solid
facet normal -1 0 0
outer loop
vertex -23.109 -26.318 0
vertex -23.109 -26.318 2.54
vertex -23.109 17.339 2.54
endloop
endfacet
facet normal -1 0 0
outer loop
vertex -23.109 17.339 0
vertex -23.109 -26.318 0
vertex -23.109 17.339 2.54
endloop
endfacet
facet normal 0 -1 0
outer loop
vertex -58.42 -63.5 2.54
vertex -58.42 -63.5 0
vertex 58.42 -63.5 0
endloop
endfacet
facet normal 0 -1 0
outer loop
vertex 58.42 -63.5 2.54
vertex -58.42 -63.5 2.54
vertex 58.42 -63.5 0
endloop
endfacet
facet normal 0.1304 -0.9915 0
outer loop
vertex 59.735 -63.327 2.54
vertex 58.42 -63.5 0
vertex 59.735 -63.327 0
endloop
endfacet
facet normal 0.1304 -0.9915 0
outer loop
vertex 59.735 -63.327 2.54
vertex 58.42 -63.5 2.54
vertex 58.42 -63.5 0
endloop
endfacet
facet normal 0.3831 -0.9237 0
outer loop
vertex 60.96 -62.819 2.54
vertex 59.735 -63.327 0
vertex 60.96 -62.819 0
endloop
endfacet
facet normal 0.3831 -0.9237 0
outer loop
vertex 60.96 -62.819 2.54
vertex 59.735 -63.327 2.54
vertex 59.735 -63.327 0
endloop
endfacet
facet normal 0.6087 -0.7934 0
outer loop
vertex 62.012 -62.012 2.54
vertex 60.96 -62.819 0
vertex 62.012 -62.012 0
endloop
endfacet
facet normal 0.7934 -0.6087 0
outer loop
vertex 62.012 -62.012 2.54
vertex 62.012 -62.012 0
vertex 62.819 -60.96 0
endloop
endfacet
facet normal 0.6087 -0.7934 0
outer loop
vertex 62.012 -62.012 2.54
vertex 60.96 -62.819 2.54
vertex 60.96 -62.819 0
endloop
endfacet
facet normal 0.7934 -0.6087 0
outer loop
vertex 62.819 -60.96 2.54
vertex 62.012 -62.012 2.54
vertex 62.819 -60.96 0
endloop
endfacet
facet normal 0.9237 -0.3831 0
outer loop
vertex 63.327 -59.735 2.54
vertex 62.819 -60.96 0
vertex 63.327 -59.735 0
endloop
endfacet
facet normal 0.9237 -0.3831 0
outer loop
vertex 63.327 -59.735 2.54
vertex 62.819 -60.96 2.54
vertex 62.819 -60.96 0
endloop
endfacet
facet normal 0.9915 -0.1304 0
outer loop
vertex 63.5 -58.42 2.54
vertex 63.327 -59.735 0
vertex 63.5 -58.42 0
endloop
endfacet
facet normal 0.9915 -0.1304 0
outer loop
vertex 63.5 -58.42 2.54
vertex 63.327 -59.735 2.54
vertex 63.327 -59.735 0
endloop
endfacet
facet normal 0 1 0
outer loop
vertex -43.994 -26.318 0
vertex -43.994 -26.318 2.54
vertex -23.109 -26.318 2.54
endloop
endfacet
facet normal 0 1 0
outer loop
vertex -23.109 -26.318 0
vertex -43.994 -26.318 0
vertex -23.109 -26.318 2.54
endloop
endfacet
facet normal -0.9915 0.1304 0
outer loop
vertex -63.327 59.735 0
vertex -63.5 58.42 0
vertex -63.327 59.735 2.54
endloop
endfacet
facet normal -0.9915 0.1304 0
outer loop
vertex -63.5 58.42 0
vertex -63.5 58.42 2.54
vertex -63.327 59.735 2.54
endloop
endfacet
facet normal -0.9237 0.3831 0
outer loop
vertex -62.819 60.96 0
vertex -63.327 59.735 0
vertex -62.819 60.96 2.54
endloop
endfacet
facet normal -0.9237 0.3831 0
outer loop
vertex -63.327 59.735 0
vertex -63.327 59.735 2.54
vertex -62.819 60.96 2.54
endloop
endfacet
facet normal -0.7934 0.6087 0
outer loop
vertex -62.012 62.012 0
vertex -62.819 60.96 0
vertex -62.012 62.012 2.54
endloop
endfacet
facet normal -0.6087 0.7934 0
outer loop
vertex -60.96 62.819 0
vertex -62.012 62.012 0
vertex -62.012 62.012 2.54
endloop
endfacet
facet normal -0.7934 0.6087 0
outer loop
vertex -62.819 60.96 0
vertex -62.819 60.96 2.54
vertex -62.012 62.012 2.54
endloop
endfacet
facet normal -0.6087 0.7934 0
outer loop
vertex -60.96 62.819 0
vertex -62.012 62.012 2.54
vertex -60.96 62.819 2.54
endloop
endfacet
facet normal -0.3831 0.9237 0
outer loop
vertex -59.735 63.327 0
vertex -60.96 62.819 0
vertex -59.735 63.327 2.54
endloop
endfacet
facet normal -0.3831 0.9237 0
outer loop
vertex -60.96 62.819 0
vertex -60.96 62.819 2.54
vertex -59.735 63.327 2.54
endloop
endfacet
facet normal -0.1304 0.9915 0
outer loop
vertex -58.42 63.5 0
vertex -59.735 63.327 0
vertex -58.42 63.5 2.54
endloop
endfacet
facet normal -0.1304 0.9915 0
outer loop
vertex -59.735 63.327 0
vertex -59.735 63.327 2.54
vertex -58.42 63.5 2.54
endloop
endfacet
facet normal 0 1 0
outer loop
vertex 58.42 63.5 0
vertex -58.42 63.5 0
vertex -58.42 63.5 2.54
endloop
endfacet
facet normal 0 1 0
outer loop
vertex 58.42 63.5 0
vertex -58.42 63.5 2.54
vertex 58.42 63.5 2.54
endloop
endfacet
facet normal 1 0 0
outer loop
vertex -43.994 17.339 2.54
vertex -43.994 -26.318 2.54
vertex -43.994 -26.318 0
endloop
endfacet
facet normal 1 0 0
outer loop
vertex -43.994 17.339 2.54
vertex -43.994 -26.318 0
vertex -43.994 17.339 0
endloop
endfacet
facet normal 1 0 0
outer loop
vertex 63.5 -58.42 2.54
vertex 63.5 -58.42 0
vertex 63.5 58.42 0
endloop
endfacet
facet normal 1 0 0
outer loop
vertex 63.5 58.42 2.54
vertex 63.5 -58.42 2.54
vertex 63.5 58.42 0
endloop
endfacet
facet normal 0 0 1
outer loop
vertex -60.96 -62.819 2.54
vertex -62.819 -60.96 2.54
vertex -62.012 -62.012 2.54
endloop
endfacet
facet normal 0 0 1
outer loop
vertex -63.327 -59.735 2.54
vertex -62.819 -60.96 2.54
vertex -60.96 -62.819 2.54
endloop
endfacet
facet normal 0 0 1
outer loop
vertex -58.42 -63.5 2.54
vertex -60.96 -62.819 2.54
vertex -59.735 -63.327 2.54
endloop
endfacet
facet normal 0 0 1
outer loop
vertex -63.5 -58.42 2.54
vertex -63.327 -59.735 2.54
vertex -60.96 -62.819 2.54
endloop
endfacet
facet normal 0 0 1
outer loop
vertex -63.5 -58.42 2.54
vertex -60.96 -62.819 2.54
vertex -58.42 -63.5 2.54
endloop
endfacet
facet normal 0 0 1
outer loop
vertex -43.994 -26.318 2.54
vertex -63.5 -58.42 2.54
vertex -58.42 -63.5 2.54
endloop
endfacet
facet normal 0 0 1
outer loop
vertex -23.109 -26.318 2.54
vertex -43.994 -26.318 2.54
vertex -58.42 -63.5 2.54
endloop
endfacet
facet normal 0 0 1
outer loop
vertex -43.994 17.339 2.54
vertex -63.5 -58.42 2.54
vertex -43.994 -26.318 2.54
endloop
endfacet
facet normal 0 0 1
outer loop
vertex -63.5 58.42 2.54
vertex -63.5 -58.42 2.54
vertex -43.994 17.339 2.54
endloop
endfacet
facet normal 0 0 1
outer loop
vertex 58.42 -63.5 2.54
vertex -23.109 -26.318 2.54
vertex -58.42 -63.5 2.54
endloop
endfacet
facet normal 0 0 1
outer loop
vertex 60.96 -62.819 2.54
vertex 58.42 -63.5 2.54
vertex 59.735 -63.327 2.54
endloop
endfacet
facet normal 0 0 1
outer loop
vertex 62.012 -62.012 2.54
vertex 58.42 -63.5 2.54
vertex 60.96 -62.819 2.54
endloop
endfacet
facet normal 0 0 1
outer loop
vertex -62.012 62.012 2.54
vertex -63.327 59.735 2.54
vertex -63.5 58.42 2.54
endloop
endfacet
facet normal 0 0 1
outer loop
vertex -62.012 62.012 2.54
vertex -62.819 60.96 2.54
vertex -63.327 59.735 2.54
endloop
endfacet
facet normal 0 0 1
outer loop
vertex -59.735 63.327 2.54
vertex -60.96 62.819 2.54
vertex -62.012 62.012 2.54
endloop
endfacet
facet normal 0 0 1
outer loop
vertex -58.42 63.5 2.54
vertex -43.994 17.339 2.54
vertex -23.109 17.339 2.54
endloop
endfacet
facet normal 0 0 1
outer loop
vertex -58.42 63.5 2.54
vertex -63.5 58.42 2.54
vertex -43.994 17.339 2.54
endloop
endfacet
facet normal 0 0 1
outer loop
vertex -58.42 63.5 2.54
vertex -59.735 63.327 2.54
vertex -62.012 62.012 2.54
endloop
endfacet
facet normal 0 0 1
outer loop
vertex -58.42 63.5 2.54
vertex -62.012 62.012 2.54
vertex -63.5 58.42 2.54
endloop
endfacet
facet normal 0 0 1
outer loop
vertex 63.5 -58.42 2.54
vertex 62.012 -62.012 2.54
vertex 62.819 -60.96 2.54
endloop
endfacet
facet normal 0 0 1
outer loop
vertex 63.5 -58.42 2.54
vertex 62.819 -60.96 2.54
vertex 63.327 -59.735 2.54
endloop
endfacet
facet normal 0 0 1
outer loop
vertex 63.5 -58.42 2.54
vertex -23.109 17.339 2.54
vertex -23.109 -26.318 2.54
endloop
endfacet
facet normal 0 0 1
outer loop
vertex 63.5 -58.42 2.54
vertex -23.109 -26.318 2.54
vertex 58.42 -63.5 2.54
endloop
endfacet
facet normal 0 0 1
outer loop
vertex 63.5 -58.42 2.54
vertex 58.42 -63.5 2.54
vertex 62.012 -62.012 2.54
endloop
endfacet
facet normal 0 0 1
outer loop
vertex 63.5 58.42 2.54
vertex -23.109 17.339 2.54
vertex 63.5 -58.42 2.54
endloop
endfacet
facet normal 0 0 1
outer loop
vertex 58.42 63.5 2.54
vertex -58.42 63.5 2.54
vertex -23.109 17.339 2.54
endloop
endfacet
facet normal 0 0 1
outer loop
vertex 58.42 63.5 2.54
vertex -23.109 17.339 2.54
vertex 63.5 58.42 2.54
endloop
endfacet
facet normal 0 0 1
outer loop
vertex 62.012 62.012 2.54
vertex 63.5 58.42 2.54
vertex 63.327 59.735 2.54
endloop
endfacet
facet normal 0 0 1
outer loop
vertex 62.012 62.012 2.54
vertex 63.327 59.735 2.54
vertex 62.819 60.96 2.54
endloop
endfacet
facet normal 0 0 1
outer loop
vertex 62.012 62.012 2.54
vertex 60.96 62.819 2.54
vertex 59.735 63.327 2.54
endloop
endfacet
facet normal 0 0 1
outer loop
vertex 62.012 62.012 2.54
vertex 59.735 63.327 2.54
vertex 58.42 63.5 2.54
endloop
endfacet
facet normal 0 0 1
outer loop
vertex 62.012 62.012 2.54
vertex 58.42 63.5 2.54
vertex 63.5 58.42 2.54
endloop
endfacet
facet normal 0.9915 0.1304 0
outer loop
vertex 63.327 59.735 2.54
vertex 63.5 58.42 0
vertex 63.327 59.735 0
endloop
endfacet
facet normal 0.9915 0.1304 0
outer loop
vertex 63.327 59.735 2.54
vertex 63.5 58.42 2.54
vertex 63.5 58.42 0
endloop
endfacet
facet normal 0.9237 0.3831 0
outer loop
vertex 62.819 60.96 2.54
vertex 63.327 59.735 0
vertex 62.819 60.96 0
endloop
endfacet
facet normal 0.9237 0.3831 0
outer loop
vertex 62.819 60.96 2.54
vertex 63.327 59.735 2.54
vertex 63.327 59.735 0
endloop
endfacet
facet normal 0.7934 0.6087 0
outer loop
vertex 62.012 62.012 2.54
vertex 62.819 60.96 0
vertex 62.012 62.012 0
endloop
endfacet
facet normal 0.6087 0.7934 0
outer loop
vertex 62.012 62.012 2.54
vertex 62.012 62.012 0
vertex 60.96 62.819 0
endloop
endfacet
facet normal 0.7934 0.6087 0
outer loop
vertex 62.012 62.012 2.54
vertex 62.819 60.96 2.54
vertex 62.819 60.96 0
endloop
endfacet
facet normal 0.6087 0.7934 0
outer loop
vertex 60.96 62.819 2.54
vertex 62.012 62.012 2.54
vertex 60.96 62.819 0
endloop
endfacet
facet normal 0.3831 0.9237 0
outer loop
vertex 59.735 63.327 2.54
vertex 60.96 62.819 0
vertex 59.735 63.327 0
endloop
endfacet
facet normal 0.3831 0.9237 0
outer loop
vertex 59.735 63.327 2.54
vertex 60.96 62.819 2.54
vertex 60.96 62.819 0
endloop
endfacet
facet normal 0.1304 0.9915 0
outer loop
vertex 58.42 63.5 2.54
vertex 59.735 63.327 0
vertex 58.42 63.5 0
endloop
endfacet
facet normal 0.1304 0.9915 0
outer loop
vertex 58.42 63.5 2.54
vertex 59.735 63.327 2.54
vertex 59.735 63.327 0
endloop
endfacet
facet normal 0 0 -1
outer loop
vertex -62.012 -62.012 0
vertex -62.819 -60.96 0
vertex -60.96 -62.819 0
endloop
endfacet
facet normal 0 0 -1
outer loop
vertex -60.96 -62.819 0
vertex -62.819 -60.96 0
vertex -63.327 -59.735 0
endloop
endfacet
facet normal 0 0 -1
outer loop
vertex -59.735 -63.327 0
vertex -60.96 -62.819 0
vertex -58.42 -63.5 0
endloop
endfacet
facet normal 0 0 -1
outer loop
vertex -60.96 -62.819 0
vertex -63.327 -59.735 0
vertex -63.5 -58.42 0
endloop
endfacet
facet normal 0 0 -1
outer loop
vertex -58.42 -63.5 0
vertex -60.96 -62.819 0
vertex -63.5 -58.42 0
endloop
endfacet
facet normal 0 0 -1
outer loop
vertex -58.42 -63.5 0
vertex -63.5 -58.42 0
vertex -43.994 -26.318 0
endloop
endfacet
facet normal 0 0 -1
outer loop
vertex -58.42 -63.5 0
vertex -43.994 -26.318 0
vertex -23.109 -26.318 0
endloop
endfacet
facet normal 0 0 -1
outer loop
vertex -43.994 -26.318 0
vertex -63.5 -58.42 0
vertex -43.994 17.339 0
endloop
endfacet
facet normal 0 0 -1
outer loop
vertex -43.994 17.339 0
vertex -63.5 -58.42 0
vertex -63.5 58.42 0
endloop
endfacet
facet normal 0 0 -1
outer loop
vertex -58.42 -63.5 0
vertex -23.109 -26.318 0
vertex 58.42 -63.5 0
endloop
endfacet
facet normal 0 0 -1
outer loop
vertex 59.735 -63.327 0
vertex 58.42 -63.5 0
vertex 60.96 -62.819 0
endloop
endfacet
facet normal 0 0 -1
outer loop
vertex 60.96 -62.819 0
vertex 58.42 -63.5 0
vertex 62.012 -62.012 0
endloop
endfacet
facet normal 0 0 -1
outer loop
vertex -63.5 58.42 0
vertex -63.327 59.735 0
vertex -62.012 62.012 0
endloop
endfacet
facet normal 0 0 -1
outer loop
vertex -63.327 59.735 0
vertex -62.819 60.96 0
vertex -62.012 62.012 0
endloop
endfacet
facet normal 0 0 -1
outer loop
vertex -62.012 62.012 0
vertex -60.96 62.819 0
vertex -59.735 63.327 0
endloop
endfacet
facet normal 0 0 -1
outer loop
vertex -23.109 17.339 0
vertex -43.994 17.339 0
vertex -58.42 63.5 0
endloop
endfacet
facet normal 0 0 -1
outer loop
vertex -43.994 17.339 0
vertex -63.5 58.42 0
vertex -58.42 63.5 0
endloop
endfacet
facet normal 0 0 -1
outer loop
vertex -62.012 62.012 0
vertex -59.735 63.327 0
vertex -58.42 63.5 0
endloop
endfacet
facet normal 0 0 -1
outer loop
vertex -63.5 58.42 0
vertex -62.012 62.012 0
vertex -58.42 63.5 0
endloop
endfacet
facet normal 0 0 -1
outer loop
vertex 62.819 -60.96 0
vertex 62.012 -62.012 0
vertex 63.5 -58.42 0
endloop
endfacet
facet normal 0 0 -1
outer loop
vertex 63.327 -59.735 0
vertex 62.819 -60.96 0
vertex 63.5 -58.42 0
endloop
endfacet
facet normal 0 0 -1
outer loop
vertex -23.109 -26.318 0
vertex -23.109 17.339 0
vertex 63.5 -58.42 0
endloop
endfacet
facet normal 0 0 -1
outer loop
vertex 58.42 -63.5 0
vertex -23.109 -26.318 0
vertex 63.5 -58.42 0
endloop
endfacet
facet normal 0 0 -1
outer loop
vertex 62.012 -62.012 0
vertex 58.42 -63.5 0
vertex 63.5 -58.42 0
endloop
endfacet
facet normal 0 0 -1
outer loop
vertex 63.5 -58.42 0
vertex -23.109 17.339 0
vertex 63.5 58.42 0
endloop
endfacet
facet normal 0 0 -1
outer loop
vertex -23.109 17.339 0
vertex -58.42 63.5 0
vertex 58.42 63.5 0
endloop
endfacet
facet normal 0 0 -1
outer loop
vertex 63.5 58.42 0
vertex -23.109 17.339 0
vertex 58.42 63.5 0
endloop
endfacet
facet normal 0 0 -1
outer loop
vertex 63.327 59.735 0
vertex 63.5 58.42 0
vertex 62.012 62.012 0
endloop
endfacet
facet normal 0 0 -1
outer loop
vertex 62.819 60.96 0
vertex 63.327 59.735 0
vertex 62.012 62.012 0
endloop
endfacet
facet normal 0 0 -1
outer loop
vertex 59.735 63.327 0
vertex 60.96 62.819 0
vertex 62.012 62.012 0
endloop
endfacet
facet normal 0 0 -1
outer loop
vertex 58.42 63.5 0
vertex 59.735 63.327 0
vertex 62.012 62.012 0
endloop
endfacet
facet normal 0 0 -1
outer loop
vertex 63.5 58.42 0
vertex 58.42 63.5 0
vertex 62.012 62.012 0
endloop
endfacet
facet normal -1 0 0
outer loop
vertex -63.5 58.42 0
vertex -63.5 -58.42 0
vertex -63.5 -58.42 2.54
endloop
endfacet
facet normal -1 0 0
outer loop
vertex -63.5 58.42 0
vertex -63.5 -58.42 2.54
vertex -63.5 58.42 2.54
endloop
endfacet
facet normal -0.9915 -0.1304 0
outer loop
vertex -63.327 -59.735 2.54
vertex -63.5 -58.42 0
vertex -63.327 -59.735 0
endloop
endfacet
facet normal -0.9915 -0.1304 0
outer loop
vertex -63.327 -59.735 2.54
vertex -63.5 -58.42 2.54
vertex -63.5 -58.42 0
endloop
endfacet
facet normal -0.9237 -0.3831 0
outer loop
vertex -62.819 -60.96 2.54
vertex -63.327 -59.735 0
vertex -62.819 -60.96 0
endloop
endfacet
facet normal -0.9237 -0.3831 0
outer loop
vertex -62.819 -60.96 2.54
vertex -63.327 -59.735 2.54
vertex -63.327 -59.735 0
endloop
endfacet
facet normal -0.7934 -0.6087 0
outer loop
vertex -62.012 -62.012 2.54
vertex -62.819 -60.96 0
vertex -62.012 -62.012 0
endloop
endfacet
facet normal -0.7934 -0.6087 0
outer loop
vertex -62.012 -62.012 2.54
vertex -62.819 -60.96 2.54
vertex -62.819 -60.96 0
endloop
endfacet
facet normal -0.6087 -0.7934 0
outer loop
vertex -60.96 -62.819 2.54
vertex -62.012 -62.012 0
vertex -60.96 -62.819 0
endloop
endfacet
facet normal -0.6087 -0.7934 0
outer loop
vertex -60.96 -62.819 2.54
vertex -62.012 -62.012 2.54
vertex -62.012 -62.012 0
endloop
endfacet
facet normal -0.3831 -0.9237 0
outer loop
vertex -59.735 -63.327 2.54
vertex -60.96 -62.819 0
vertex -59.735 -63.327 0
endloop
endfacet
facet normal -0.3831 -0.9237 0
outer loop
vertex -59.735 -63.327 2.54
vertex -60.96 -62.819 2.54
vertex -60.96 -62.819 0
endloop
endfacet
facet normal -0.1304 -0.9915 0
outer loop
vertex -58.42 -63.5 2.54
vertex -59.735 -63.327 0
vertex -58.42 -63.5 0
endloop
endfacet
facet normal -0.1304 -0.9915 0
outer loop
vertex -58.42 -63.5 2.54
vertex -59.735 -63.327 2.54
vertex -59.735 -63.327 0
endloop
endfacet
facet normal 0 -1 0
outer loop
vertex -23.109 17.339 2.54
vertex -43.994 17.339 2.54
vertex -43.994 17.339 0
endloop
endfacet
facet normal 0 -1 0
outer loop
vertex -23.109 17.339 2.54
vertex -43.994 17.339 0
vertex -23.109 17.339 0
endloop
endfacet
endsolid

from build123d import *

# Parameters (mm, degrees)
F0_W     = 127
F0_H     = 127
F1_DEPTH = 2.54
F2_R     = 5.08
F3_W     = 20.884663
F3_H     = 43.656439
F4_DEPTH = 25.4


with BuildPart() as f1:
    # F0 (on Top) → F1 (new body)
    with BuildSketch(Plane.XY):
        Rectangle(F0_W, F0_H)
    extrude(amount=F1_DEPTH)

    # F2
    f2_edges = [f1.edges().sort_by_distance(p)[0] for p in [
        (63.5, -63.5, 1.27),
        (63.5, 63.5, 1.27),
        (-63.5, 63.5, 1.27),
        (-63.5, -63.5, 1.27),
    ]]
    fillet(f2_edges, radius=F2_R)

    # F3 (on face) → F4 (cut)
    with BuildSketch(Plane.XY.offset(2.54)):
        with Locations((-33.551299, -4.489437)):
            Rectangle(F3_W, F3_H)
    extrude(amount=-F4_DEPTH, mode=Mode.SUBTRACT)


solid = f1.part
